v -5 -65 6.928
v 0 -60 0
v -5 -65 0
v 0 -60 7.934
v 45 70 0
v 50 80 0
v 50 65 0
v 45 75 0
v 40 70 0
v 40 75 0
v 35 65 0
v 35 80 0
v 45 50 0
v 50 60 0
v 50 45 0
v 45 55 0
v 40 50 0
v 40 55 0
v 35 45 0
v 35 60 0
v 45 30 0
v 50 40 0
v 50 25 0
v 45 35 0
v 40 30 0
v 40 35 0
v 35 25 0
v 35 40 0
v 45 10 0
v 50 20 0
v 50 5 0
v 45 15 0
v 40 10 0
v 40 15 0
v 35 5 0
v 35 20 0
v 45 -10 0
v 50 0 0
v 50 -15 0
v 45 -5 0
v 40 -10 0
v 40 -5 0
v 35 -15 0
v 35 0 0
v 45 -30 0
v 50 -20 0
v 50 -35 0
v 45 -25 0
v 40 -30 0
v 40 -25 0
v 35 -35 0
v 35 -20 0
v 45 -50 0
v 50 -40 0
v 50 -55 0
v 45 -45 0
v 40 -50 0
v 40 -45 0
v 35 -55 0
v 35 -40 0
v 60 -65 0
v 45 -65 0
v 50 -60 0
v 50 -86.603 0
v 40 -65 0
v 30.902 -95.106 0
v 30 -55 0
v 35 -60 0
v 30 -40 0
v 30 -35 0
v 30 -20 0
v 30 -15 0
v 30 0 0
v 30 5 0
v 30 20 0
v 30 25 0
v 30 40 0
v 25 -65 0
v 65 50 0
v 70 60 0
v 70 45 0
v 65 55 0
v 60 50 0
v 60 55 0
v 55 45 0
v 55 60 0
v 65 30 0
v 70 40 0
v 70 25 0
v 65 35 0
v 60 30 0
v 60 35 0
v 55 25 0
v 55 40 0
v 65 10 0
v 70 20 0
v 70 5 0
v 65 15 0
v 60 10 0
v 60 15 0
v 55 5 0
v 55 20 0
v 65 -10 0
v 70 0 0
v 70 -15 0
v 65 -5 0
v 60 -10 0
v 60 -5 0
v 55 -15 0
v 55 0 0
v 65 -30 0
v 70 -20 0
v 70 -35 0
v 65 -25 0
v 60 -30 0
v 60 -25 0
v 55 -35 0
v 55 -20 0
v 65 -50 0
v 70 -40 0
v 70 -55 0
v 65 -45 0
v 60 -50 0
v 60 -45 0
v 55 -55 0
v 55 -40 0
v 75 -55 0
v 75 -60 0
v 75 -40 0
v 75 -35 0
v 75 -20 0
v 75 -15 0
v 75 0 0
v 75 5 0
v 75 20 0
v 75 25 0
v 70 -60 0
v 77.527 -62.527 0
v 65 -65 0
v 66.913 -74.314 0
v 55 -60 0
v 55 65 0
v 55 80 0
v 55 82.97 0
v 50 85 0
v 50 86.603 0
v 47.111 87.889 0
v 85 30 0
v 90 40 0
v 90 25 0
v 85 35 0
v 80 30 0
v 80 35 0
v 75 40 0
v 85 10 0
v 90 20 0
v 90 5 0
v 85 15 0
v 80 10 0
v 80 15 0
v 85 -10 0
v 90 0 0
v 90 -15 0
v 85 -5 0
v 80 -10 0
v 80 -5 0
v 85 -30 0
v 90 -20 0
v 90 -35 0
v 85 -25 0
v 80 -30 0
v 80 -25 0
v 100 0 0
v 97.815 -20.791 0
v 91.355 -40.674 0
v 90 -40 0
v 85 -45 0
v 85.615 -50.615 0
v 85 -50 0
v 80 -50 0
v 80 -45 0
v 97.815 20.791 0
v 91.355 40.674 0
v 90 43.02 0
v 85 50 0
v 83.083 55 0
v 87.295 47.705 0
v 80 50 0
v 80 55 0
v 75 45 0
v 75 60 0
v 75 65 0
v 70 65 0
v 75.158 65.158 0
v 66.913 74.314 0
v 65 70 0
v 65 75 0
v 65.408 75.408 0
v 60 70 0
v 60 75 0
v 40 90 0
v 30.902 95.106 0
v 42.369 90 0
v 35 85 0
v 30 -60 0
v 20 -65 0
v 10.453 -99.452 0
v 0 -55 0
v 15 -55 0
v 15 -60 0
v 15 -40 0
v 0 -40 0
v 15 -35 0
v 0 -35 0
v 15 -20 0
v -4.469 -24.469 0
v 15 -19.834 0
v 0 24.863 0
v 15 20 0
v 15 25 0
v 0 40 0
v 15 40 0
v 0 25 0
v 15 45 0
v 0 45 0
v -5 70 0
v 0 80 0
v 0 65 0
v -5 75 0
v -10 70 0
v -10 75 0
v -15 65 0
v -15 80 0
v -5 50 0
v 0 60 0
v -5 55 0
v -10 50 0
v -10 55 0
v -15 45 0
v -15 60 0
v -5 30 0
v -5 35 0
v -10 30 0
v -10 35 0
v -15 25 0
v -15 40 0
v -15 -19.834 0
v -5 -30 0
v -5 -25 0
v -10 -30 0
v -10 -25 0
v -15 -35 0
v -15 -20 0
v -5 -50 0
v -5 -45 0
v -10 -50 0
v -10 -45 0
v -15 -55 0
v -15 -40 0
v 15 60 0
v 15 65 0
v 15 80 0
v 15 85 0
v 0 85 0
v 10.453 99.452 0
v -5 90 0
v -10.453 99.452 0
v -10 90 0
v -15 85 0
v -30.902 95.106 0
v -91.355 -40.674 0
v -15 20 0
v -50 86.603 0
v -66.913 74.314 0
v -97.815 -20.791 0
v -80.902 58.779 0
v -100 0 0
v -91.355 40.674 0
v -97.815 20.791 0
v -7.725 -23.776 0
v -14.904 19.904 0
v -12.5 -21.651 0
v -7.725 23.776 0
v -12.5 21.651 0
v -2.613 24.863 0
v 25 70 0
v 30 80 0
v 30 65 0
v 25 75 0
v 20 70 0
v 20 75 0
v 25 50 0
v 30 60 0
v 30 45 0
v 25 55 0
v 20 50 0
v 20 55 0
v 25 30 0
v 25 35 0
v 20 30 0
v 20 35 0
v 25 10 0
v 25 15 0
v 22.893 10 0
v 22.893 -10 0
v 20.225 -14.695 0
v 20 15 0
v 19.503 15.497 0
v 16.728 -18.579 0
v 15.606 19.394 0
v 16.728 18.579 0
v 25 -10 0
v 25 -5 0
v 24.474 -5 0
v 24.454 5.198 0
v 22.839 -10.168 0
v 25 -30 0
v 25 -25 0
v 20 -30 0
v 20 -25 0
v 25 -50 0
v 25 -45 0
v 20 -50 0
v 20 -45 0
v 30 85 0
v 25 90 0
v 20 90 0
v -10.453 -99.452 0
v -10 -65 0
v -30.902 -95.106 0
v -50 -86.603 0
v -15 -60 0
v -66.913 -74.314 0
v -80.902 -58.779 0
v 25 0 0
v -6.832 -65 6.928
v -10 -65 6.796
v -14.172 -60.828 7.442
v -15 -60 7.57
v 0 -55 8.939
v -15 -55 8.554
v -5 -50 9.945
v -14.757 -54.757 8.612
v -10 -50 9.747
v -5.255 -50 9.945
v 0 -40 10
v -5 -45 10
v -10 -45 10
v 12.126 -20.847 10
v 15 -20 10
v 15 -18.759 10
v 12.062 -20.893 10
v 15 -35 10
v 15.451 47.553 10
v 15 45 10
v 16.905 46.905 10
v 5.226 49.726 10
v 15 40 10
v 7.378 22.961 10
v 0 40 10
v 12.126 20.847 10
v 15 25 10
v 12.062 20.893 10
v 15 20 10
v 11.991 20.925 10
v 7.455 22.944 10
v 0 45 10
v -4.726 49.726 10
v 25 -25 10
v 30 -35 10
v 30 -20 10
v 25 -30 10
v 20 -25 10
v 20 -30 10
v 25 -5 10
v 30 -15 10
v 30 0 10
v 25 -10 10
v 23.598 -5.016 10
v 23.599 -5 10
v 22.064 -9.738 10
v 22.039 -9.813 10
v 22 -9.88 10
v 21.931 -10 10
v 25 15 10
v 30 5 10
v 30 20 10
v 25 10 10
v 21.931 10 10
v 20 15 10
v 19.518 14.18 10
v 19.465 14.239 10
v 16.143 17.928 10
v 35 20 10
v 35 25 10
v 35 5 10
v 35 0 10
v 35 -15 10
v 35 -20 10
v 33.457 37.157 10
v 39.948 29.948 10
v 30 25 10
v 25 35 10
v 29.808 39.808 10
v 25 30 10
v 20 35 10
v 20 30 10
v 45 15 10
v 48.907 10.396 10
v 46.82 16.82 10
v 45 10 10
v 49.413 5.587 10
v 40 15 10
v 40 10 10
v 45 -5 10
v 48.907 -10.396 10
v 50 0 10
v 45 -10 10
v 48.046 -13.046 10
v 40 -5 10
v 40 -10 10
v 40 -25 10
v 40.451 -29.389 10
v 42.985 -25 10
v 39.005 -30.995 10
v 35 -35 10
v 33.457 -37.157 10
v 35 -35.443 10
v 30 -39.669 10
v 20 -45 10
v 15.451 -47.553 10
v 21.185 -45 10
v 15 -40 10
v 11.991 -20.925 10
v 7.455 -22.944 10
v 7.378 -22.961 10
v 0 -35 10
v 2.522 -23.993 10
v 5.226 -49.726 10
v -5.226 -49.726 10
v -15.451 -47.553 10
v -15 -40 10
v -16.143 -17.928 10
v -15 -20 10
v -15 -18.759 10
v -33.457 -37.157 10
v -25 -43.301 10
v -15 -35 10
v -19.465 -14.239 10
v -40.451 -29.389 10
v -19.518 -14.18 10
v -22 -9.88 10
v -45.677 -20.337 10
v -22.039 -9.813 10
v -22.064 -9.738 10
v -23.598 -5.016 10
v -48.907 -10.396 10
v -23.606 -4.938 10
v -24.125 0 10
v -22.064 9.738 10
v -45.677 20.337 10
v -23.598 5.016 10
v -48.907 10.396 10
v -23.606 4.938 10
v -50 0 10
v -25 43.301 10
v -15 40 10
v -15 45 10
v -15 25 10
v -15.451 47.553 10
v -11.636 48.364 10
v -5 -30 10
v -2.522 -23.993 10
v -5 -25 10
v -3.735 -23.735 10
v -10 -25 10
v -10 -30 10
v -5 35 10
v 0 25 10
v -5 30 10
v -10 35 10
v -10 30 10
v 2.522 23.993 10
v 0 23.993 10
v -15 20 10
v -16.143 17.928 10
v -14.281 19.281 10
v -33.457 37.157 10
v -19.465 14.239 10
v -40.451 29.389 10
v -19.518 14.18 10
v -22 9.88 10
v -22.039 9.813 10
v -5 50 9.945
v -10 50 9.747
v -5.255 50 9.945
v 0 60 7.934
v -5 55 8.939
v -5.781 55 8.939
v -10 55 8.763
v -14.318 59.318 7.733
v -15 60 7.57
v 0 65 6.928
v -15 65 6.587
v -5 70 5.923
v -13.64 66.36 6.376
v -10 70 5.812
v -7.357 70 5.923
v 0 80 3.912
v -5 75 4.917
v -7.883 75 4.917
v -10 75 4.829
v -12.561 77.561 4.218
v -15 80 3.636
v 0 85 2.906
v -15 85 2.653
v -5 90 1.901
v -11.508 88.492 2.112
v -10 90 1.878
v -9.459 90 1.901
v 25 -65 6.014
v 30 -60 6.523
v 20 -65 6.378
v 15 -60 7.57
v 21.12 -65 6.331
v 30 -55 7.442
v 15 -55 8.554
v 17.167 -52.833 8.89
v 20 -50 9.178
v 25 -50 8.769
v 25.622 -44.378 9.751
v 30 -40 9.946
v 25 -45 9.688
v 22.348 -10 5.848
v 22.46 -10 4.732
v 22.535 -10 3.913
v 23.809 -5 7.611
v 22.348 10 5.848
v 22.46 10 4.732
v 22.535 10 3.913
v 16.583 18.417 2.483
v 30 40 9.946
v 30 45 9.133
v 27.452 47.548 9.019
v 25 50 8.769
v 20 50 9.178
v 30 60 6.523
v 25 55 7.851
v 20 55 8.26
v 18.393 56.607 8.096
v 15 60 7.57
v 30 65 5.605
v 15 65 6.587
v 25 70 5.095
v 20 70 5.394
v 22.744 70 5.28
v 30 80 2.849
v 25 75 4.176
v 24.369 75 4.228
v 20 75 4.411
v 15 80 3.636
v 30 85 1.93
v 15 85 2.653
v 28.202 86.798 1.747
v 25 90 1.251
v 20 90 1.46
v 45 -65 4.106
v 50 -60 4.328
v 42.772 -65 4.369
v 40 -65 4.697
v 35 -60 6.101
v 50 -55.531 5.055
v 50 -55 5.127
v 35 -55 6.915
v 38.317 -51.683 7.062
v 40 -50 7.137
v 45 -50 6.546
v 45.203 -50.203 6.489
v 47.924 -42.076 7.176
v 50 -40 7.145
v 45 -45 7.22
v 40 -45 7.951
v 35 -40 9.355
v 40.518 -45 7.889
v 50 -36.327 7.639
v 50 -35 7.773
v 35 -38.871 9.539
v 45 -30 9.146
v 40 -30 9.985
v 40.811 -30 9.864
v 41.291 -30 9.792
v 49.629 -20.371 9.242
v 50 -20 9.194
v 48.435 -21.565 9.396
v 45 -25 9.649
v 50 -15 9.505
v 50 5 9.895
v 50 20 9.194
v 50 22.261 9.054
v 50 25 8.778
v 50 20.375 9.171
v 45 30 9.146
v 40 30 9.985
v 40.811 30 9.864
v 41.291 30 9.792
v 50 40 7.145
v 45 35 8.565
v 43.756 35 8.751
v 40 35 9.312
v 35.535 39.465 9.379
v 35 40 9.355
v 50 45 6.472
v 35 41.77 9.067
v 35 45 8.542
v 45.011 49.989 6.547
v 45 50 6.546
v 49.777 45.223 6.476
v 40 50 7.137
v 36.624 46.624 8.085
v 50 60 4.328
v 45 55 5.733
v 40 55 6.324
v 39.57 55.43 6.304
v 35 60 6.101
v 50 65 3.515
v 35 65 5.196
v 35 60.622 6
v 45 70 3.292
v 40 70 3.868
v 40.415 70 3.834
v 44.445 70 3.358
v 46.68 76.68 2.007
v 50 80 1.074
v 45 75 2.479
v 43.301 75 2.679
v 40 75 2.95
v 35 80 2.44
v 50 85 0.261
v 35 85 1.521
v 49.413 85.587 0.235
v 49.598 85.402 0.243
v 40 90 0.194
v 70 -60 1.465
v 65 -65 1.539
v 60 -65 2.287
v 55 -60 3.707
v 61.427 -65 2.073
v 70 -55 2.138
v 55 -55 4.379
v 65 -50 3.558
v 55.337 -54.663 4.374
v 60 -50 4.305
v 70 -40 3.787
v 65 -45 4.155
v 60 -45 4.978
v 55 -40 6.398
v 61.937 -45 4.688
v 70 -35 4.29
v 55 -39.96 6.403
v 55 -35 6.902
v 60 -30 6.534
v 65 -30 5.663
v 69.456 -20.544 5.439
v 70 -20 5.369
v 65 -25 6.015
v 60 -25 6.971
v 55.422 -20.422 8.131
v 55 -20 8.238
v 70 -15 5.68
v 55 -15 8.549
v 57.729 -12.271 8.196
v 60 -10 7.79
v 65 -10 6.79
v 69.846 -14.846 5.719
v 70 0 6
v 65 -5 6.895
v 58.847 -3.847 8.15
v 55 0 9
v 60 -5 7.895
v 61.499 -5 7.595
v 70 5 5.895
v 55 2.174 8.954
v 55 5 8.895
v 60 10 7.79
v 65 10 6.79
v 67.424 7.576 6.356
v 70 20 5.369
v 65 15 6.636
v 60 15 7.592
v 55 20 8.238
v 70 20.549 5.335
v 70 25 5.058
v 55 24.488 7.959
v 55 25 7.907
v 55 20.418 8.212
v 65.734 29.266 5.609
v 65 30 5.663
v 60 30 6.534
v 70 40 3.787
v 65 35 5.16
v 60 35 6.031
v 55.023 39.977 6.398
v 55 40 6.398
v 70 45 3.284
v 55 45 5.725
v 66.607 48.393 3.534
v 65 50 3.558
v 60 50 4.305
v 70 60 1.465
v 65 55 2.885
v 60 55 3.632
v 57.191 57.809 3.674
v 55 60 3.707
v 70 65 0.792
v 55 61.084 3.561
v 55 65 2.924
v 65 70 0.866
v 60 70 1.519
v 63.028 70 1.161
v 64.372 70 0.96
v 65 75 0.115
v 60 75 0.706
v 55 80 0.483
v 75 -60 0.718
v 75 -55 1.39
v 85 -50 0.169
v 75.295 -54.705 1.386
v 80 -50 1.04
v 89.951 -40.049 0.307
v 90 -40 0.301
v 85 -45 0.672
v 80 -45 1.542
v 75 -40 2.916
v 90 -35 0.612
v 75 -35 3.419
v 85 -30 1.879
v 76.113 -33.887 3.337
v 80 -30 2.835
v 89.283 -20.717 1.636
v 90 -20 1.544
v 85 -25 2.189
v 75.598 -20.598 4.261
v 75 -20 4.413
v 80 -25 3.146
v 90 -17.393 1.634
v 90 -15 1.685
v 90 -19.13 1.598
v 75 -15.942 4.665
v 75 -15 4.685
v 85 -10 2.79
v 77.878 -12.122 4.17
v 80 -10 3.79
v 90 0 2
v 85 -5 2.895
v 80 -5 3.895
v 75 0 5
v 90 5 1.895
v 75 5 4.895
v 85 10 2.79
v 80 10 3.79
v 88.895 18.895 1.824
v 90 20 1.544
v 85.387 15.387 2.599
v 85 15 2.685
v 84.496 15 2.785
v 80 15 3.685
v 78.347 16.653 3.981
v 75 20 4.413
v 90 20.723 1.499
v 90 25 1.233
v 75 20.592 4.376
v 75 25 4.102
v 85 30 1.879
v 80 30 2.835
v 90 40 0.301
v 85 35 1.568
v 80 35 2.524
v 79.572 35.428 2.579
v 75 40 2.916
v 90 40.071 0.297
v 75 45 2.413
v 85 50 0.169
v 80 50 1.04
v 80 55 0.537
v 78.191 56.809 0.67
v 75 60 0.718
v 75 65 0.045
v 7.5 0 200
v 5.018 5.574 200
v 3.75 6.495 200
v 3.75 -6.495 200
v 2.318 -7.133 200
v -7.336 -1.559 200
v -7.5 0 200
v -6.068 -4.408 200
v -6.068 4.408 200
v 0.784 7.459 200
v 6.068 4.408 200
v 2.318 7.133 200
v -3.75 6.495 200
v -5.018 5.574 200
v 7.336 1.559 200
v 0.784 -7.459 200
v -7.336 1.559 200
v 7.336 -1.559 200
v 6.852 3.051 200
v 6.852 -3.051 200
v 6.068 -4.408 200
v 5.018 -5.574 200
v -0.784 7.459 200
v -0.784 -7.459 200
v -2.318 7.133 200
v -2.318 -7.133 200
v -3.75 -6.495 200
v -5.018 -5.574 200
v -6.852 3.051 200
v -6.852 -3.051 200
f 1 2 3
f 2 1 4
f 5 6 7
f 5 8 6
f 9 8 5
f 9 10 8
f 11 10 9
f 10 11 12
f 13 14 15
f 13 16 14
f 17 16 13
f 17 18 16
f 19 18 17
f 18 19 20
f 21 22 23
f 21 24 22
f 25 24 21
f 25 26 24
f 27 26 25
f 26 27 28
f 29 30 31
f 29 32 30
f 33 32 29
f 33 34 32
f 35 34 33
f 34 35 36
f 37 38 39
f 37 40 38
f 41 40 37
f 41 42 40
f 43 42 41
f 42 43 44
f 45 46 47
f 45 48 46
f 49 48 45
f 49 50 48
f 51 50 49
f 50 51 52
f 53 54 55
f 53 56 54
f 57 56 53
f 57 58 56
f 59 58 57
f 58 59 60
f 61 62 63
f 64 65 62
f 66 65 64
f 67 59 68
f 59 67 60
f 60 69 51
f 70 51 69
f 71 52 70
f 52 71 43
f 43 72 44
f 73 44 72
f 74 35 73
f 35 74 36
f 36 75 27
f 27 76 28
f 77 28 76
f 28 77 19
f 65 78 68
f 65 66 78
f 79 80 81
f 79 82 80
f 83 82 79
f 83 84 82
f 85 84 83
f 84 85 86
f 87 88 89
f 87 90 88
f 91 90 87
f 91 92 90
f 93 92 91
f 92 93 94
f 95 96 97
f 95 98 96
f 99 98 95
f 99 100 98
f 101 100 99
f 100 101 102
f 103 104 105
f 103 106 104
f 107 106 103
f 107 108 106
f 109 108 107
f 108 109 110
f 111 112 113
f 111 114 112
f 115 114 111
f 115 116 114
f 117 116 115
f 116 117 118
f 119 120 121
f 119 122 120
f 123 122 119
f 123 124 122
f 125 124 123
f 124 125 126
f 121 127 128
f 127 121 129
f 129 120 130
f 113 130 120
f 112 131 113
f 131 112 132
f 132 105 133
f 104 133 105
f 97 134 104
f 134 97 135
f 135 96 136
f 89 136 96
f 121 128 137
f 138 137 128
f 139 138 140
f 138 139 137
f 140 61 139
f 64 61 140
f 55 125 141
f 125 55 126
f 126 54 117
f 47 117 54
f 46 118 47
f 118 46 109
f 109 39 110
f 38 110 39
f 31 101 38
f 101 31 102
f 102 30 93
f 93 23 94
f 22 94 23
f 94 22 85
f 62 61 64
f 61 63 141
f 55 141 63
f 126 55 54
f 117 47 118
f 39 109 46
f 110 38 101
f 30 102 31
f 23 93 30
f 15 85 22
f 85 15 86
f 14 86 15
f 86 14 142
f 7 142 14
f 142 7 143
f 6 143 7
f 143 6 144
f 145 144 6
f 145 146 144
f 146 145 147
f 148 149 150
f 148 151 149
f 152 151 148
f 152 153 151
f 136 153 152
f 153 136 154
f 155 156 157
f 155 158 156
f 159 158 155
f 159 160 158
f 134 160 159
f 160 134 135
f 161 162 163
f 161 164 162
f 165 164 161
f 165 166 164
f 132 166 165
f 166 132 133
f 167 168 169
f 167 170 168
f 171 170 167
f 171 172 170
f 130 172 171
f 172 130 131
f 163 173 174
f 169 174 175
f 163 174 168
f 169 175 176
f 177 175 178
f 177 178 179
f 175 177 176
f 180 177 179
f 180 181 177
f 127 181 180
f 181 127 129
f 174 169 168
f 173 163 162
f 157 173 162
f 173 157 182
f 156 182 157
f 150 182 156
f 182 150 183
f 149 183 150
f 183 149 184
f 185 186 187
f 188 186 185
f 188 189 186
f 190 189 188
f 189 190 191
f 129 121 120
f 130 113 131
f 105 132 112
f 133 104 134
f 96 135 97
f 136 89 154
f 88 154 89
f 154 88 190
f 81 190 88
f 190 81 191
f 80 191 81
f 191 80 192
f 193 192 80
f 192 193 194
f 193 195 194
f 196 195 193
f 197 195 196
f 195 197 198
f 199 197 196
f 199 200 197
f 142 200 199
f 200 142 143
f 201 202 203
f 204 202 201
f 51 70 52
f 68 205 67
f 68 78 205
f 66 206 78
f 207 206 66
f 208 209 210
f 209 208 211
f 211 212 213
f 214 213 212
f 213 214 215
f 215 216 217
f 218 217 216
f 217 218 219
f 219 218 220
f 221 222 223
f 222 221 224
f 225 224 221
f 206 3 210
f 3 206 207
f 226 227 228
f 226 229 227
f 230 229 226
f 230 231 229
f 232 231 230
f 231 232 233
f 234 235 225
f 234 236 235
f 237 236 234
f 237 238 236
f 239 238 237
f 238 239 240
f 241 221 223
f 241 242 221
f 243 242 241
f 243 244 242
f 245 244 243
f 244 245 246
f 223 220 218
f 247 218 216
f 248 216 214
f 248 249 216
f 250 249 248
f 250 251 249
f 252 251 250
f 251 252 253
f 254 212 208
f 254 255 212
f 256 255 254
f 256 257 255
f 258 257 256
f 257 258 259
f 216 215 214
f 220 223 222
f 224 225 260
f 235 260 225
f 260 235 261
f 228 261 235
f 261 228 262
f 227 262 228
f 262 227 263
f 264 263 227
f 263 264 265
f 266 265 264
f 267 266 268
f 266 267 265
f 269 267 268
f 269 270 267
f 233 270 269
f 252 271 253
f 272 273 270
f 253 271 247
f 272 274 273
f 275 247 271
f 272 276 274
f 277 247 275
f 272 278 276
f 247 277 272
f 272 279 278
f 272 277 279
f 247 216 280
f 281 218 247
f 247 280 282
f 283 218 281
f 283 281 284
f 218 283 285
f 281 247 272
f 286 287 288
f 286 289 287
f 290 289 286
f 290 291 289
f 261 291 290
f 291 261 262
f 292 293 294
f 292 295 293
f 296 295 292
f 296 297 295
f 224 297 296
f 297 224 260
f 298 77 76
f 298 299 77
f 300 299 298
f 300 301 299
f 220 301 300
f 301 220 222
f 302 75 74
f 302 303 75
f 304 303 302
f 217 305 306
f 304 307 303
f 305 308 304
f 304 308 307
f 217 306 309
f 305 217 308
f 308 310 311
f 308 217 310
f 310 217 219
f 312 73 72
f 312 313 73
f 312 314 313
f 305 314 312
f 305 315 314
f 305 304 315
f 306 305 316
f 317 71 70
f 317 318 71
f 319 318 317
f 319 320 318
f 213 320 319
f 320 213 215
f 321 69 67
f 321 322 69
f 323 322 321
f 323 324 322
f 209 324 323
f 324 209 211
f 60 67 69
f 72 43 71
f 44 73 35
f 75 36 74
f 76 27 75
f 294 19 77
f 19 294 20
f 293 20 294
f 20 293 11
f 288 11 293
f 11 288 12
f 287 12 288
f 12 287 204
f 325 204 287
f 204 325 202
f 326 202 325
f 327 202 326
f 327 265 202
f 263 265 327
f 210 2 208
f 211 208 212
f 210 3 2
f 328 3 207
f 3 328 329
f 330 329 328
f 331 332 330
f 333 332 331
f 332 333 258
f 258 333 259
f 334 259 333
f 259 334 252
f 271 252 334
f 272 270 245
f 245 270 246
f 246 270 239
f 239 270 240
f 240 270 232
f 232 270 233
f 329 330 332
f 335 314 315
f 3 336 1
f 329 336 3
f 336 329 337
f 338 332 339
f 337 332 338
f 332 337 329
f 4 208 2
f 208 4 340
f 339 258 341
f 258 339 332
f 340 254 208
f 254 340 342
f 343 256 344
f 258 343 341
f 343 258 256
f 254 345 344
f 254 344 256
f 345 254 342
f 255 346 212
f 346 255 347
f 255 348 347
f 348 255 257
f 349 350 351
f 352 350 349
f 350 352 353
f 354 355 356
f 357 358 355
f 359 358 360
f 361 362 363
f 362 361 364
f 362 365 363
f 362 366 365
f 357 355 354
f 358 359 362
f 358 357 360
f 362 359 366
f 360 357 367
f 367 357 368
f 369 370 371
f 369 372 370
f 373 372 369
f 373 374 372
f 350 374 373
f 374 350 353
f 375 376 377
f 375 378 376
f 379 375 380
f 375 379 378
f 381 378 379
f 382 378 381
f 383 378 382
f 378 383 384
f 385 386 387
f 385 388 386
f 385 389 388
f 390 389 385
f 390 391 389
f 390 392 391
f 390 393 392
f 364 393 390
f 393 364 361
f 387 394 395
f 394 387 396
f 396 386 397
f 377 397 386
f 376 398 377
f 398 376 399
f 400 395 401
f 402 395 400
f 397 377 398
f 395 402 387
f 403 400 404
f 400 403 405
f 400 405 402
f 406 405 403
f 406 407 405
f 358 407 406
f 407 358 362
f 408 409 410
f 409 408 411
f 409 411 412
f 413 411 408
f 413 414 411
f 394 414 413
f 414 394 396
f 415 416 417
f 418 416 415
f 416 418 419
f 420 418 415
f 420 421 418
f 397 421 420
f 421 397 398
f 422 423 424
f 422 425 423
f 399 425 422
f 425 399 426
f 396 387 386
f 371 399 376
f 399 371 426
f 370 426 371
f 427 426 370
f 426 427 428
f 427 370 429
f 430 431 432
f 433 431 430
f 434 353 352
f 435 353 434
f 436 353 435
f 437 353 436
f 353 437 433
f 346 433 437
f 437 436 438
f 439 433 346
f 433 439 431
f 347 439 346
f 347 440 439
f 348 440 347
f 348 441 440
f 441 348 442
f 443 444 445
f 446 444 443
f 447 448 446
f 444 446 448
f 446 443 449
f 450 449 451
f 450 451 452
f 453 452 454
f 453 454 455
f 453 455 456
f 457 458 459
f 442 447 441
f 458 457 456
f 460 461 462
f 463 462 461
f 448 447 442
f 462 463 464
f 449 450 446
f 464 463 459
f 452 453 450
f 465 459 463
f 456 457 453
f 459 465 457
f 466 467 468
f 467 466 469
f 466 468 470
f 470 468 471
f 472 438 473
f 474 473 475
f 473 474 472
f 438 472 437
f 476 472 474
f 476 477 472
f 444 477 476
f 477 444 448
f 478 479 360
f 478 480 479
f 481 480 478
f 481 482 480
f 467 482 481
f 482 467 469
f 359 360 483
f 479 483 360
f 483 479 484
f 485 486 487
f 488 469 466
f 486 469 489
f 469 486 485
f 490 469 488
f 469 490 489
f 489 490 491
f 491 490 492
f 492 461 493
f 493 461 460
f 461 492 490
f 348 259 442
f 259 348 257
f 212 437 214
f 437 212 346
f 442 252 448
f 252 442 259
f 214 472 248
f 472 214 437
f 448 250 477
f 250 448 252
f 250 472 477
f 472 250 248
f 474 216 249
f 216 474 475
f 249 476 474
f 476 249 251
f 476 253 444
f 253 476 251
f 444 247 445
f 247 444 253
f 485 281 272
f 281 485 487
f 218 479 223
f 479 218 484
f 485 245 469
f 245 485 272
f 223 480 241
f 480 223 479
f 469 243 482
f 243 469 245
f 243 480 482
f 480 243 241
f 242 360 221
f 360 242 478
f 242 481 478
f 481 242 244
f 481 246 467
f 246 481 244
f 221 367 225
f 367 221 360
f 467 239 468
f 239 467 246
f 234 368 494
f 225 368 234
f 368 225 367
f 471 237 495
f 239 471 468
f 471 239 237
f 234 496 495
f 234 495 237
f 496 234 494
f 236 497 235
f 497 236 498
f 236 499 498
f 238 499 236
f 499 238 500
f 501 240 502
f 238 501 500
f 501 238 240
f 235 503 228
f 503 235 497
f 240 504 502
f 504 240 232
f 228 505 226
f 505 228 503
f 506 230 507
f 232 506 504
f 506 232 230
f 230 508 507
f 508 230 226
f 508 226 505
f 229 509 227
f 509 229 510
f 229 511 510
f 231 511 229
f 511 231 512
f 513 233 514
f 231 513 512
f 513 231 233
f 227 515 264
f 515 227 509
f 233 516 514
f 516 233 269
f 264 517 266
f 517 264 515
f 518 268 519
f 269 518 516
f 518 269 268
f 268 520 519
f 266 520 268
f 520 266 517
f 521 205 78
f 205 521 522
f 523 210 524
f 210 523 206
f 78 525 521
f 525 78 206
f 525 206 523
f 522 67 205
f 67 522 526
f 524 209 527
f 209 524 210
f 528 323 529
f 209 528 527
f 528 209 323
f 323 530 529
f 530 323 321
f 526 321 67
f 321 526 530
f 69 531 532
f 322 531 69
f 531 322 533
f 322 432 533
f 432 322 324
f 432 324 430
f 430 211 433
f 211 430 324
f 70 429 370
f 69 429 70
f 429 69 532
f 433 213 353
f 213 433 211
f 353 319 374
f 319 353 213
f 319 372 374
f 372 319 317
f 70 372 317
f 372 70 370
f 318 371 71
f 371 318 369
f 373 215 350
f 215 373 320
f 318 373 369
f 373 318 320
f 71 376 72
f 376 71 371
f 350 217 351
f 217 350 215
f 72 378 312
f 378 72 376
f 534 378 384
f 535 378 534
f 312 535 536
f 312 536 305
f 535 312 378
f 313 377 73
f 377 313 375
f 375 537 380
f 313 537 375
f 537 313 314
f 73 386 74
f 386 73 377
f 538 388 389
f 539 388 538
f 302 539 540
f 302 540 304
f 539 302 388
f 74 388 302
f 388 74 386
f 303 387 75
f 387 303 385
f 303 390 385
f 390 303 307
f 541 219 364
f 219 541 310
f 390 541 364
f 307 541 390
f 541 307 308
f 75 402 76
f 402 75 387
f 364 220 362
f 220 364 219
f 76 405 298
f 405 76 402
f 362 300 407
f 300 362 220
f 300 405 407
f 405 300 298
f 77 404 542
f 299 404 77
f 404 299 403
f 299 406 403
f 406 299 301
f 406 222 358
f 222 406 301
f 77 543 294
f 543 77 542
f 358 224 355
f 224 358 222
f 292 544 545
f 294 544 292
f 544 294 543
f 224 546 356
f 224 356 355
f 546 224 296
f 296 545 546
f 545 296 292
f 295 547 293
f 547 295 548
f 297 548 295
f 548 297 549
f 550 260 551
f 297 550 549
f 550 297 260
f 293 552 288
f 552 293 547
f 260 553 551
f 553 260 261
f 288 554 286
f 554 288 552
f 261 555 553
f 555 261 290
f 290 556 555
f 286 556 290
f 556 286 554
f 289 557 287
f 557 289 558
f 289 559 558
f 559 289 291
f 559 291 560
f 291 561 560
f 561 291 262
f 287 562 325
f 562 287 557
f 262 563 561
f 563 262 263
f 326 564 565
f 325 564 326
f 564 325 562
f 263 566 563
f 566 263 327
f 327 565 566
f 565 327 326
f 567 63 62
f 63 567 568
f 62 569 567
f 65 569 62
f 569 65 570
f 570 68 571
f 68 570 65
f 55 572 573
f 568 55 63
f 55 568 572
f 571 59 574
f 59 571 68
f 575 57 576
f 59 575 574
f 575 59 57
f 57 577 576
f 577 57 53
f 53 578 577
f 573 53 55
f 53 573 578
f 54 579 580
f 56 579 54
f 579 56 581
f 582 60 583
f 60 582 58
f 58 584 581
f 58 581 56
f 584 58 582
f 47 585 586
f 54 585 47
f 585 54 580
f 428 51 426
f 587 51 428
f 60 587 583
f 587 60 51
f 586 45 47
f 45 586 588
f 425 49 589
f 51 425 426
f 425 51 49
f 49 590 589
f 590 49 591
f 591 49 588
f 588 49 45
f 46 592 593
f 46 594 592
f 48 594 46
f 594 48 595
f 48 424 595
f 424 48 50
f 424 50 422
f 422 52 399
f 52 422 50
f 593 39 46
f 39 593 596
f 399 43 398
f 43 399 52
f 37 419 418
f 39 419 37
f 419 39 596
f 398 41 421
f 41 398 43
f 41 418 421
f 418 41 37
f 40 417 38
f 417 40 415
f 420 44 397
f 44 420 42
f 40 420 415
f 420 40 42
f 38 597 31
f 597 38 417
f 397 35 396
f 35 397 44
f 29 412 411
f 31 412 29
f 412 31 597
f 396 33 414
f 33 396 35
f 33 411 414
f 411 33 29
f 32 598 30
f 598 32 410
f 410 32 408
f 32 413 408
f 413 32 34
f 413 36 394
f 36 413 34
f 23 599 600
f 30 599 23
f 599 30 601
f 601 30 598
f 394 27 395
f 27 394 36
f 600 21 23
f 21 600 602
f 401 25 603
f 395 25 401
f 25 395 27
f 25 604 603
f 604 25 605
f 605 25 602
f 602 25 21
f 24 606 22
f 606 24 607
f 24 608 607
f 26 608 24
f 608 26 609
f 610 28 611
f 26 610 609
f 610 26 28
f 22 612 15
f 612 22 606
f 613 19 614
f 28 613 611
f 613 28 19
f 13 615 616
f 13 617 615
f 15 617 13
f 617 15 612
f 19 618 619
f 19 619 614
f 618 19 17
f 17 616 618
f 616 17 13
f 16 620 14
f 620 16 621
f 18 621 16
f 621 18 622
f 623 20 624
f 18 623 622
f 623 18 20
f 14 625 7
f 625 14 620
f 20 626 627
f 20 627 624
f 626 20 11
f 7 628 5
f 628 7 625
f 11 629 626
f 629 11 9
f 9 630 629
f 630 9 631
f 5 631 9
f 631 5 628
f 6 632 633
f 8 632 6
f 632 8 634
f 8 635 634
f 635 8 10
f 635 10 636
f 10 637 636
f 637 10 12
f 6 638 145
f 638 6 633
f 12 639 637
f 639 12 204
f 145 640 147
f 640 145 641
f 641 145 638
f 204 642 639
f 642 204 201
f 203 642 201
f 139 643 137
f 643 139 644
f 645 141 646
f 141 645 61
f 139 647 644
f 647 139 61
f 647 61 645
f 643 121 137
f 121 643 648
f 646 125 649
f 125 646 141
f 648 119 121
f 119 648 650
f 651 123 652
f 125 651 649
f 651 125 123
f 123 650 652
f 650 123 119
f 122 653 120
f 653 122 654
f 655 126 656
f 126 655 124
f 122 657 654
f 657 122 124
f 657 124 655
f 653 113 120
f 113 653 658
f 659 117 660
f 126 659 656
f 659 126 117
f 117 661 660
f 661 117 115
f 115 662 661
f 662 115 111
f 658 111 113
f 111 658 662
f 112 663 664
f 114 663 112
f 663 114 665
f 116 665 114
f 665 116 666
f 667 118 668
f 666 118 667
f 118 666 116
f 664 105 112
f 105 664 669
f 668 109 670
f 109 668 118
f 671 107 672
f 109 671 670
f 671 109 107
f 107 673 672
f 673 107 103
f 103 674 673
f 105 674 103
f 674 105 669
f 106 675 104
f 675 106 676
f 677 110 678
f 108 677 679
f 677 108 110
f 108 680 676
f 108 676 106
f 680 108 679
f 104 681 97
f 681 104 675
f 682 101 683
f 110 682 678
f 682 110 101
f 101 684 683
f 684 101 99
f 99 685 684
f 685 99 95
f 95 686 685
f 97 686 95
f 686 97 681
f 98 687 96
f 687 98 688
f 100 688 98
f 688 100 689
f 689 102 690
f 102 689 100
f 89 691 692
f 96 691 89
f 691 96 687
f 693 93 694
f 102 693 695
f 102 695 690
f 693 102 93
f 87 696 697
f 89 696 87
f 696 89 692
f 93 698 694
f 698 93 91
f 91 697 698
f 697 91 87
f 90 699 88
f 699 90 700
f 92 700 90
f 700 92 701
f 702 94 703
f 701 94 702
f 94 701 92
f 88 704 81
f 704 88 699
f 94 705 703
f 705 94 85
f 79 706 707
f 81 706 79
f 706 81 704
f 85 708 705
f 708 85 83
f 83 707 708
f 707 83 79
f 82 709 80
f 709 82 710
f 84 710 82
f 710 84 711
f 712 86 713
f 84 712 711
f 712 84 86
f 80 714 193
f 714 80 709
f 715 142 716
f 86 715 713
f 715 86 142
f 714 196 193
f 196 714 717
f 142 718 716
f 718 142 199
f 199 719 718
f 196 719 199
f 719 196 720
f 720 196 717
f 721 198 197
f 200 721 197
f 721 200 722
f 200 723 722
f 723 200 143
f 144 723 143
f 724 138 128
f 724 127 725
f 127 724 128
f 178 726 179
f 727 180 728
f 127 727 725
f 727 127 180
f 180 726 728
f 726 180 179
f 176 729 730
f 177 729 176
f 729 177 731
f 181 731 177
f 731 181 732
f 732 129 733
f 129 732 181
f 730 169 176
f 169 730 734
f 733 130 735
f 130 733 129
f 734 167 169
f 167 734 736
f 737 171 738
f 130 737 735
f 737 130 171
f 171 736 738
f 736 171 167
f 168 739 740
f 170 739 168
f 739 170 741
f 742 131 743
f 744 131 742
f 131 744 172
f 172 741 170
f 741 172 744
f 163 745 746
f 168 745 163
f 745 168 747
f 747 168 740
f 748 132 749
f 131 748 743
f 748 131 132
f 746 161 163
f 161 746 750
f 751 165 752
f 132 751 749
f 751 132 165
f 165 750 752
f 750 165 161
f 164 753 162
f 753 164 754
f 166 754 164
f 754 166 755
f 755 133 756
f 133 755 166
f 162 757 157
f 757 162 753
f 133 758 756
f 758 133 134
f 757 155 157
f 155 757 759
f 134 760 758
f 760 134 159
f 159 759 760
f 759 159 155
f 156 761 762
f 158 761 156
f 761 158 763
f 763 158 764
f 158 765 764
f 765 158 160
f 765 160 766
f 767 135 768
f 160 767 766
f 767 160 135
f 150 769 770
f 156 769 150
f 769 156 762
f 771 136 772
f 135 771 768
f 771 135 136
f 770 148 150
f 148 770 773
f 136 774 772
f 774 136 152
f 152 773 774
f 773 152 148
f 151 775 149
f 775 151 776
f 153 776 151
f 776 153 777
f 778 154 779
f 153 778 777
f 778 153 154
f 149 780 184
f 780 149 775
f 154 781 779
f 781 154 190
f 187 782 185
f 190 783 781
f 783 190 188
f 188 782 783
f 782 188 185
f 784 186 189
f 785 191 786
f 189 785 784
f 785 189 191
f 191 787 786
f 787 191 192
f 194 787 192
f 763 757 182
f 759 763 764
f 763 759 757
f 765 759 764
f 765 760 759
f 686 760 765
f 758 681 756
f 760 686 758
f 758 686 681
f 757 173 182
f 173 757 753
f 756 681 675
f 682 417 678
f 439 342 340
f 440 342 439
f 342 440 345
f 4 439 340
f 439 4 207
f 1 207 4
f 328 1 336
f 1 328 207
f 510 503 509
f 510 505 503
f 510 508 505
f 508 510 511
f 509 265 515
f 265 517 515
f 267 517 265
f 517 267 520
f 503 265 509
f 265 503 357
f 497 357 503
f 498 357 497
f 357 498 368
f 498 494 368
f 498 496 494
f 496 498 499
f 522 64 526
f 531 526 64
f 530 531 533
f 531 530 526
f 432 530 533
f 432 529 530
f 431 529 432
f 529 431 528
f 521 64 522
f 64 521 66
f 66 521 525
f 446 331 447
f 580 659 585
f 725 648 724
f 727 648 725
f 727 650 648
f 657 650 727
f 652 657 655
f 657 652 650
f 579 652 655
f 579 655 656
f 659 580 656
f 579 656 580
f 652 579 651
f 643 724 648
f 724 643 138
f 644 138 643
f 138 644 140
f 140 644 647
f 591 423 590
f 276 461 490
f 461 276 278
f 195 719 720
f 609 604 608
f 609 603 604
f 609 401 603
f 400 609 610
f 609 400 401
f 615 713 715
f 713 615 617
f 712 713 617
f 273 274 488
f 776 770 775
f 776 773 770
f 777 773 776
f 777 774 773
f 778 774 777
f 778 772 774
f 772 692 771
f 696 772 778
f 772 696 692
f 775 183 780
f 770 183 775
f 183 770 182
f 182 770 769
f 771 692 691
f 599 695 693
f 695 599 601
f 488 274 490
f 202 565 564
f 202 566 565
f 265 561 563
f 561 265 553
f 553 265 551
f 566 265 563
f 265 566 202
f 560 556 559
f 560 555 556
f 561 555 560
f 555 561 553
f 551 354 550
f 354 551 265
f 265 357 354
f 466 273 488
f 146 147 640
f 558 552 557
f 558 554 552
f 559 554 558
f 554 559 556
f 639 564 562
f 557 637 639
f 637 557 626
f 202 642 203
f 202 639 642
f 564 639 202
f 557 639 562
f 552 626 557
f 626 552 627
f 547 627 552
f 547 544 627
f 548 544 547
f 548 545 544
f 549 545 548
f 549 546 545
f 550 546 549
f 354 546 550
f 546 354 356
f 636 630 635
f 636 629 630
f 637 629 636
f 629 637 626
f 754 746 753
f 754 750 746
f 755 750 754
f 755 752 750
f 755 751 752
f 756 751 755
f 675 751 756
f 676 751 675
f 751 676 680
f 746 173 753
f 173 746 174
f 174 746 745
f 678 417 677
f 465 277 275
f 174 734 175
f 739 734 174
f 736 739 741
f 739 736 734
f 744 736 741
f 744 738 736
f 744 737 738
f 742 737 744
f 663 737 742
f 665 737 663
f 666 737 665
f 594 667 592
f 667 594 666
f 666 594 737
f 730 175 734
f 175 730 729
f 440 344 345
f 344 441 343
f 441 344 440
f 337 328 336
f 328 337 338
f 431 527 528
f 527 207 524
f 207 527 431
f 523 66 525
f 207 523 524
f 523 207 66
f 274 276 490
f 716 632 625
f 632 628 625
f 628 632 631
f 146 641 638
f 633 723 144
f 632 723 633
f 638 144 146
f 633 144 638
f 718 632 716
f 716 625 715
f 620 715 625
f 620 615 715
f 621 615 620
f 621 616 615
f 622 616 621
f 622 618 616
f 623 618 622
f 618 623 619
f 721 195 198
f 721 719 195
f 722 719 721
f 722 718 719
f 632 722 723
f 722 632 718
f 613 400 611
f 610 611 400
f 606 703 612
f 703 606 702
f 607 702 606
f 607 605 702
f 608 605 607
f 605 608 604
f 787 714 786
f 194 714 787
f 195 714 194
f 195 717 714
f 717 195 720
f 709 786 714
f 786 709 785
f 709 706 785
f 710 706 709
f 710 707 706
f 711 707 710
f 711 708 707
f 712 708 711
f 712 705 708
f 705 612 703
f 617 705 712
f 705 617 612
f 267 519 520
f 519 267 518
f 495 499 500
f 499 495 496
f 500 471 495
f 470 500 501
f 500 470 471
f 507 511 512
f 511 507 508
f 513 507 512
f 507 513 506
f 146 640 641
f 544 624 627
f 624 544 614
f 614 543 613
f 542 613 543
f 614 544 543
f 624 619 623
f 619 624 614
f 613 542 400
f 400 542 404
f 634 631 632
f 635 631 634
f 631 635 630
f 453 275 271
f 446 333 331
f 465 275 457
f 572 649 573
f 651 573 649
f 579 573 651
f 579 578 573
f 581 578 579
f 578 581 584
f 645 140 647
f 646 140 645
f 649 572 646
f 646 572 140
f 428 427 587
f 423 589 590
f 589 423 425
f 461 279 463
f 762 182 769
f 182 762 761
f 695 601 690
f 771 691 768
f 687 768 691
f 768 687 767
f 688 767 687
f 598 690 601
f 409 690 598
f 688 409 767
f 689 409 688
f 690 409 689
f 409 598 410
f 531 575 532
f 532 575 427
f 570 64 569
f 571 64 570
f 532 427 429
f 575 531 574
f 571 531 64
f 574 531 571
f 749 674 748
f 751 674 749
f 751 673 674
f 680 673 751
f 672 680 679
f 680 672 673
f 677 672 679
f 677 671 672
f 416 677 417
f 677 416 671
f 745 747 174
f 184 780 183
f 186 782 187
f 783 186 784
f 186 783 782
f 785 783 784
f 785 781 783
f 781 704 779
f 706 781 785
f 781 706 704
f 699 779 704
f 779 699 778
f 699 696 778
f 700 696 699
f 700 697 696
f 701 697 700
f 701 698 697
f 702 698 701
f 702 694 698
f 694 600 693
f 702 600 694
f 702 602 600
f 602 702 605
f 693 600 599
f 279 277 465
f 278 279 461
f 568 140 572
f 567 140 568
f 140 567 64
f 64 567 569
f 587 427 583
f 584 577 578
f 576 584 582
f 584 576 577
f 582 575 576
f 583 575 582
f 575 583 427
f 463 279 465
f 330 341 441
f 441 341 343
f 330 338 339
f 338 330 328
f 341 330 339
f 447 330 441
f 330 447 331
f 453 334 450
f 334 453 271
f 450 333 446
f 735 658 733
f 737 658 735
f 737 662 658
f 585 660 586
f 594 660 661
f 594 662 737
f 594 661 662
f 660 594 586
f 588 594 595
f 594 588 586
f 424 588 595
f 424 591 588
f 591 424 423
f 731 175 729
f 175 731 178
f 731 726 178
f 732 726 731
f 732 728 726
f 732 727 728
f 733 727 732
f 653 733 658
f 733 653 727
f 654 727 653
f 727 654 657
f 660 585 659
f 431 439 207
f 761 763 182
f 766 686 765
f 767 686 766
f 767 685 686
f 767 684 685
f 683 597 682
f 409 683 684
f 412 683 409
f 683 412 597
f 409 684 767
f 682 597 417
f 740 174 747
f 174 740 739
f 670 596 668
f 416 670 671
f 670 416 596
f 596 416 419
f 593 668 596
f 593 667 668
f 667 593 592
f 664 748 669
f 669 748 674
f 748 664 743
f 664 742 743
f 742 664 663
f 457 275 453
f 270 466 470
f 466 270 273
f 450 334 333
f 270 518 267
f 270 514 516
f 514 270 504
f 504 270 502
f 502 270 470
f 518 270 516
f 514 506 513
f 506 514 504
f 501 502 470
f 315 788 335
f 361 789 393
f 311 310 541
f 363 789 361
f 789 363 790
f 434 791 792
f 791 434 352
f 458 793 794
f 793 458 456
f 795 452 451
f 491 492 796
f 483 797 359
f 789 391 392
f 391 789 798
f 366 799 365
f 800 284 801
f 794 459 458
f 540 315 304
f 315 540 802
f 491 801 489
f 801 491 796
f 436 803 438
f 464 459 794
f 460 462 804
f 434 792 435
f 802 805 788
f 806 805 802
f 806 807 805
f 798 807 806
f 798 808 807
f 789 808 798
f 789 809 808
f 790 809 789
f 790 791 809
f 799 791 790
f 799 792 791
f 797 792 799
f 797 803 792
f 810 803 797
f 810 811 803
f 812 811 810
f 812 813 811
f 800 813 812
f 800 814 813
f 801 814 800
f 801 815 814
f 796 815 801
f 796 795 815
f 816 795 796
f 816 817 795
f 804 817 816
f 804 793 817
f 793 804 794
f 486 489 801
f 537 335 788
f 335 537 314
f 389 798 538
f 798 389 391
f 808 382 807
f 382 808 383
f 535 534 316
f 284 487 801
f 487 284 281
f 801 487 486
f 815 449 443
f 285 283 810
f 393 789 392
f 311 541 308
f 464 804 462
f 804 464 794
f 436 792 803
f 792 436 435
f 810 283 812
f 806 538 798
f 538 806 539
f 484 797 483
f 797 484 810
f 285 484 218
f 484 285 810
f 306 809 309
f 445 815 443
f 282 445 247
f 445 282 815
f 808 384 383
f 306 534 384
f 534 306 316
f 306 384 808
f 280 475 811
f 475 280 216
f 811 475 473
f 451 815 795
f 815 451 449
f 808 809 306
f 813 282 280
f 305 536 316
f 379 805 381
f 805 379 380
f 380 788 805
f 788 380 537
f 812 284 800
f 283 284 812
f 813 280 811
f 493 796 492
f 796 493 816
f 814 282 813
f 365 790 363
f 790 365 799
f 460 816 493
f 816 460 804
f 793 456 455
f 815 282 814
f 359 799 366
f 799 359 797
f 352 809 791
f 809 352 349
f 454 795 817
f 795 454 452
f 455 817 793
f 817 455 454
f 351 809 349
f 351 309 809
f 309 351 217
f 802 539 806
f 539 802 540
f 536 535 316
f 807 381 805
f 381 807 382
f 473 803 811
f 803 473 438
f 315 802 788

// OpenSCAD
difference(){
cylinder(h=10, d1=200, d2=100);
for ( x1 = [-15,15,35,55,75])
        for ( y1 = [-70,-50,-30,-10,10,30,50,70]) {
            translate([x1,y1,0])
            linear_extrude(height = 10)
            polygon([[5,5],[10,5],[15,10],[10,10],[0,10]]);
            translate([x1,y1+5,0])
            linear_extrude(height = 10)
            polygon([[0,5],[15,5],[15,10],[5,10],[0,10]]);
            translate([x1,y1+5,0])
            linear_extrude(height = 10)
            polygon([[0,10],[5,15],[10,15],[15,10]]);
        }
    }
cylinder(h=200, d1=50, d2=15);
